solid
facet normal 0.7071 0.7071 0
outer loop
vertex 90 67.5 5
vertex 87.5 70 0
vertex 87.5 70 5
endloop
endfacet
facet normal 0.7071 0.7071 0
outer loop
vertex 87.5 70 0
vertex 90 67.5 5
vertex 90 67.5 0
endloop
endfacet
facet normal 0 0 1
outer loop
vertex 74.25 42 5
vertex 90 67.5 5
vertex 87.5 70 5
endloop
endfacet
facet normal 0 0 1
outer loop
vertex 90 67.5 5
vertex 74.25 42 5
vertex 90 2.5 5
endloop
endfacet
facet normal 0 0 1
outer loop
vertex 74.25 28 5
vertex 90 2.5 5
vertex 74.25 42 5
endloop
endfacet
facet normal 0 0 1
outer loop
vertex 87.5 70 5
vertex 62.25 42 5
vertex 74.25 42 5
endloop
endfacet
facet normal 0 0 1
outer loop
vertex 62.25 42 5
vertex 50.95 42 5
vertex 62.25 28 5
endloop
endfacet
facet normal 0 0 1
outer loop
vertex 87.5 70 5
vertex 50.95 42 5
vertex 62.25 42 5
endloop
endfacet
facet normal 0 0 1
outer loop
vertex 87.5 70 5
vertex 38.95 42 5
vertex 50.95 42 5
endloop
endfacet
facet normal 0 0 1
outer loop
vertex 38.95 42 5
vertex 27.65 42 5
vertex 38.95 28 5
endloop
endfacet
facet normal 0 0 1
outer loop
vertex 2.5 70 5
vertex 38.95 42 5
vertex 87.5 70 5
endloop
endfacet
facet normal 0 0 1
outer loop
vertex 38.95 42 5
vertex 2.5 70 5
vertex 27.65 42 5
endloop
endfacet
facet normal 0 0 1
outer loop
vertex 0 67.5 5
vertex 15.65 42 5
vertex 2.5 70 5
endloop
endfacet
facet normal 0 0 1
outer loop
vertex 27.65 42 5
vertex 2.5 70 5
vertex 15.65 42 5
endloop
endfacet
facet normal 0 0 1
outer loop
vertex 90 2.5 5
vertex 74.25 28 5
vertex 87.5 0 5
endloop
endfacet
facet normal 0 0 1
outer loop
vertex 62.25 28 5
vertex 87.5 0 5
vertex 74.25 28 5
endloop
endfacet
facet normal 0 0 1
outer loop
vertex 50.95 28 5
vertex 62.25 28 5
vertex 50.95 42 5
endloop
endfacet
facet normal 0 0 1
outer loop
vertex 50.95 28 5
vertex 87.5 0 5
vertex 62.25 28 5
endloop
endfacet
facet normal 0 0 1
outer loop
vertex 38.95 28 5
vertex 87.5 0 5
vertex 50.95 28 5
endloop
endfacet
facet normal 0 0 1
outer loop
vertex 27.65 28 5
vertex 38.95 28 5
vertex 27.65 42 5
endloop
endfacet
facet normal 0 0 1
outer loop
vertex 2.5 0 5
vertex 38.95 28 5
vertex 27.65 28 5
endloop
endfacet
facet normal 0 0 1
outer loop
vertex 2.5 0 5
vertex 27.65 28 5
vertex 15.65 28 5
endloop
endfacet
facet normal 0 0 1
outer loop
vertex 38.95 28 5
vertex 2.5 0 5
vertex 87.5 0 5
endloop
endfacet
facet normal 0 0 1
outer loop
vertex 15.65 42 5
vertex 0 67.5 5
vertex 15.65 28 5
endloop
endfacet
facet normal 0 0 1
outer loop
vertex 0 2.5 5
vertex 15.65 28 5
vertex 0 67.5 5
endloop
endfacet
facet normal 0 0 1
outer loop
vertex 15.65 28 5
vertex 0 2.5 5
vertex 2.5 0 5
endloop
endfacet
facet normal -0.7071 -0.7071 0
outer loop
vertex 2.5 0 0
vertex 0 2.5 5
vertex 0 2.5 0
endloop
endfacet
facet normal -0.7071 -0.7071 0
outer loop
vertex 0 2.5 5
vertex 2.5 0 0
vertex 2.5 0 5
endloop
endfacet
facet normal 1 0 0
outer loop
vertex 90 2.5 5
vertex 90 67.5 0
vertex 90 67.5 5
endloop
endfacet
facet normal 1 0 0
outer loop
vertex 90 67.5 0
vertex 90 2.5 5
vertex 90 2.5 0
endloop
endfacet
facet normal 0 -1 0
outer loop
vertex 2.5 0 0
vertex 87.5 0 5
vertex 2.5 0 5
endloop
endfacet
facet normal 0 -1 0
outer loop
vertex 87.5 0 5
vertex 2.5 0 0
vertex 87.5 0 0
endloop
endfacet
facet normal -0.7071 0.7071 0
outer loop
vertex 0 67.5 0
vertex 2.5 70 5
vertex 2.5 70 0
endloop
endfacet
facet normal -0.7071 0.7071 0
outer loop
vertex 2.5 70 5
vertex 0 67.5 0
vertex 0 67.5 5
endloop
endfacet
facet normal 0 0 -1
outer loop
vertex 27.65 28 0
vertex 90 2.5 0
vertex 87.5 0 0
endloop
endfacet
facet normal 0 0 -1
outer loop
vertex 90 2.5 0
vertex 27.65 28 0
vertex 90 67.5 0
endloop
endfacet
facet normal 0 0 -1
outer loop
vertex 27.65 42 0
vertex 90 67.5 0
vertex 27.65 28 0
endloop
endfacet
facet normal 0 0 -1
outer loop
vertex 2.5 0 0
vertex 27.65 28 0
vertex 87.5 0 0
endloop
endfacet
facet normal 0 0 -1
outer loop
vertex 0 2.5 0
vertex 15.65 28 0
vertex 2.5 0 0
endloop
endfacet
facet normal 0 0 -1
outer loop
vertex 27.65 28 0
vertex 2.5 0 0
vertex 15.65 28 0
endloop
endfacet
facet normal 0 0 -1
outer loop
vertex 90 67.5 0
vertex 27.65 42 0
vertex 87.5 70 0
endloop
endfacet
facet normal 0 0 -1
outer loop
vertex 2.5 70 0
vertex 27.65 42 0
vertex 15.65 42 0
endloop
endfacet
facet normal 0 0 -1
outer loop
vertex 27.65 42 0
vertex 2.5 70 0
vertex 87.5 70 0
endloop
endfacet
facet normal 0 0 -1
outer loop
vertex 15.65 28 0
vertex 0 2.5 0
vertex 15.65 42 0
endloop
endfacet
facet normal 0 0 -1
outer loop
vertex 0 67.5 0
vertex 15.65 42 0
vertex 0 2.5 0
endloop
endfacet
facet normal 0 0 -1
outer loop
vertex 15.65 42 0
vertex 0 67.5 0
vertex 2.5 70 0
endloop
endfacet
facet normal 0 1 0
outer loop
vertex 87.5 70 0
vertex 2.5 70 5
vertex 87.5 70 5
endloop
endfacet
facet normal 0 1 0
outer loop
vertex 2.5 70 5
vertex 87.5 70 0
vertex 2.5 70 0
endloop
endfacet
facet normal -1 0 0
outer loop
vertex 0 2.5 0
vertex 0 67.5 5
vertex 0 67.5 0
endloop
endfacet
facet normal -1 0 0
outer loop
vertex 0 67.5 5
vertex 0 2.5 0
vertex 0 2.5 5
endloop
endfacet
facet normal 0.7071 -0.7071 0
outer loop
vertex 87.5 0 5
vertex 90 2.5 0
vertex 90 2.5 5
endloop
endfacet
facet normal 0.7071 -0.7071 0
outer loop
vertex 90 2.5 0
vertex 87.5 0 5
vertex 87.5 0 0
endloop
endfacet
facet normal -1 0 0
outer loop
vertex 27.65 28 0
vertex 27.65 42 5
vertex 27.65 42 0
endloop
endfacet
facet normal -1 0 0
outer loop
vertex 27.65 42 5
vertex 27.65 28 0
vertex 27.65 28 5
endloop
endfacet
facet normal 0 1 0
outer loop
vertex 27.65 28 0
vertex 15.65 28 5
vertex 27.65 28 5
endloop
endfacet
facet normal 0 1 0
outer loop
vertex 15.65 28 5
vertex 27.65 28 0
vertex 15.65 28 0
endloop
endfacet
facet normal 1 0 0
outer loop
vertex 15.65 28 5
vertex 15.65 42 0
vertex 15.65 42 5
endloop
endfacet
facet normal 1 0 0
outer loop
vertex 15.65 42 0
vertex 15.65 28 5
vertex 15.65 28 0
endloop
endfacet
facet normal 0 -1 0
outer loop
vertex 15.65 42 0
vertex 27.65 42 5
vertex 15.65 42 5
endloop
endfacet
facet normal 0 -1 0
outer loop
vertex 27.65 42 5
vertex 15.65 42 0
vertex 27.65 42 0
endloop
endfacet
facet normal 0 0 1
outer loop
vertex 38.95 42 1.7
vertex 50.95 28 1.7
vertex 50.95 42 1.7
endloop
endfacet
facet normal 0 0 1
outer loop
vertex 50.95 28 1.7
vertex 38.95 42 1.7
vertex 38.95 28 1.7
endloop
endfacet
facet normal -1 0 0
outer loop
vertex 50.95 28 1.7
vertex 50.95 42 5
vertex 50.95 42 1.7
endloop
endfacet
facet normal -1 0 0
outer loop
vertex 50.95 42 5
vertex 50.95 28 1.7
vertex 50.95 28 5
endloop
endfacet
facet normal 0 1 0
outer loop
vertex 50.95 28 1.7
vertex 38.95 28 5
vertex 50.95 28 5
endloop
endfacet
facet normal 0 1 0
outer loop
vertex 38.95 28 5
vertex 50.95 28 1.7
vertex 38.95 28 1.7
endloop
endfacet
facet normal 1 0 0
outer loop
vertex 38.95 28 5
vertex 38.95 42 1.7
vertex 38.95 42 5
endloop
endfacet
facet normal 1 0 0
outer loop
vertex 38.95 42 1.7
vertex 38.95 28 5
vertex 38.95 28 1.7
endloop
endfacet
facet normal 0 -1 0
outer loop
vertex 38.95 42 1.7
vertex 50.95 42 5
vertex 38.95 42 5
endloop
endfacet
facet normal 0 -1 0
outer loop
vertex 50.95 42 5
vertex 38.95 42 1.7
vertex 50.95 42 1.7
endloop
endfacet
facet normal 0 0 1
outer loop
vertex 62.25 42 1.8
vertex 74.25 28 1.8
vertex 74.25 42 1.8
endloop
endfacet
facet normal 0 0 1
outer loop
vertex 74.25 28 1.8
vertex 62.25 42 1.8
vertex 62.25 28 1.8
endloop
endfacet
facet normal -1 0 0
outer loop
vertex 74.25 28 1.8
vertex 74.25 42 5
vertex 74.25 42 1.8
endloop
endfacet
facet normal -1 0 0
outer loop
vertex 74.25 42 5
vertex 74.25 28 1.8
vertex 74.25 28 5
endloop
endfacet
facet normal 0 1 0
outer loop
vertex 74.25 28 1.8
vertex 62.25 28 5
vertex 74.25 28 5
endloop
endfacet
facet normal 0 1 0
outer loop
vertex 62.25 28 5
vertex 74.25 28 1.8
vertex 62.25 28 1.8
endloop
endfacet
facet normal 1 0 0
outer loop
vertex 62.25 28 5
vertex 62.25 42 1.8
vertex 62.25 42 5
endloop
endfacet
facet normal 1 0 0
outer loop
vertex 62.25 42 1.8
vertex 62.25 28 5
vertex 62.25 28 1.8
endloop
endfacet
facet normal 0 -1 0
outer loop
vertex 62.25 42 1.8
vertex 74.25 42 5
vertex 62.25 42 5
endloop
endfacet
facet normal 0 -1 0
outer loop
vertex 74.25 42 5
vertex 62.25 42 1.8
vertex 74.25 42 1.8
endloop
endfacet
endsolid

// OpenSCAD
$fn = 32;

// ----------------------------------------------------------------------
// Windowed plate: 3 voids, 90 x 70 x 5 mm
// ----------------------------------------------------------------------

// --- parameters (mm) ---
plate_l = 90;             // plate length, X
plate_w = 70;             // plate width, Y
plate_t = 5;              // plate thickness, Z
edge_margin = 10;         // wall from the plate edge to any window
windows = 3;              // number of windows in the row
win_l = 12;               // window length
win_w = 14;               // window width
win_pitch = 23.3;         // window pitch along X
depth_1 = 5;              // depth of void 1 (full thickness = through)
depth_2 = 3.3;            // depth of void 2 (full thickness = through)
depth_3 = 3.2;            // depth of void 3 (full thickness = through)
corner_c = 2.5;           // corner chamfer of the plate

profile = [[2.5, 0], [87.5, 0], [90, 2.5], [90, 67.5], [87.5, 70], [2.5, 70], [0, 67.5], [0, 2.5]];  // primary outline, 8 points, counter clockwise
void_1 = [[15.65, 28], [27.65, 28], [27.65, 42], [15.65, 42]];  // window 1 of the row, 4 points
void_2 = [[38.95, 28], [50.95, 28], [50.95, 42], [38.95, 42]];  // window 2 of the row, 4 points
void_3 = [[62.25, 28], [74.25, 28], [74.25, 42], [62.25, 42]];  // window 3 of the row, 4 points

// --- the one profile operation ---
difference() {
  linear_extrude(height = plate_t) polygon(points = profile);
  translate([0, 0, -1])
    linear_extrude(height = plate_t + 2) polygon(points = void_1);
  translate([0, 0, plate_t - depth_2])
    linear_extrude(height = depth_2 + 1) polygon(points = void_2);
  translate([0, 0, plate_t - depth_3])
    linear_extrude(height = depth_3 + 1) polygon(points = void_3);
}
